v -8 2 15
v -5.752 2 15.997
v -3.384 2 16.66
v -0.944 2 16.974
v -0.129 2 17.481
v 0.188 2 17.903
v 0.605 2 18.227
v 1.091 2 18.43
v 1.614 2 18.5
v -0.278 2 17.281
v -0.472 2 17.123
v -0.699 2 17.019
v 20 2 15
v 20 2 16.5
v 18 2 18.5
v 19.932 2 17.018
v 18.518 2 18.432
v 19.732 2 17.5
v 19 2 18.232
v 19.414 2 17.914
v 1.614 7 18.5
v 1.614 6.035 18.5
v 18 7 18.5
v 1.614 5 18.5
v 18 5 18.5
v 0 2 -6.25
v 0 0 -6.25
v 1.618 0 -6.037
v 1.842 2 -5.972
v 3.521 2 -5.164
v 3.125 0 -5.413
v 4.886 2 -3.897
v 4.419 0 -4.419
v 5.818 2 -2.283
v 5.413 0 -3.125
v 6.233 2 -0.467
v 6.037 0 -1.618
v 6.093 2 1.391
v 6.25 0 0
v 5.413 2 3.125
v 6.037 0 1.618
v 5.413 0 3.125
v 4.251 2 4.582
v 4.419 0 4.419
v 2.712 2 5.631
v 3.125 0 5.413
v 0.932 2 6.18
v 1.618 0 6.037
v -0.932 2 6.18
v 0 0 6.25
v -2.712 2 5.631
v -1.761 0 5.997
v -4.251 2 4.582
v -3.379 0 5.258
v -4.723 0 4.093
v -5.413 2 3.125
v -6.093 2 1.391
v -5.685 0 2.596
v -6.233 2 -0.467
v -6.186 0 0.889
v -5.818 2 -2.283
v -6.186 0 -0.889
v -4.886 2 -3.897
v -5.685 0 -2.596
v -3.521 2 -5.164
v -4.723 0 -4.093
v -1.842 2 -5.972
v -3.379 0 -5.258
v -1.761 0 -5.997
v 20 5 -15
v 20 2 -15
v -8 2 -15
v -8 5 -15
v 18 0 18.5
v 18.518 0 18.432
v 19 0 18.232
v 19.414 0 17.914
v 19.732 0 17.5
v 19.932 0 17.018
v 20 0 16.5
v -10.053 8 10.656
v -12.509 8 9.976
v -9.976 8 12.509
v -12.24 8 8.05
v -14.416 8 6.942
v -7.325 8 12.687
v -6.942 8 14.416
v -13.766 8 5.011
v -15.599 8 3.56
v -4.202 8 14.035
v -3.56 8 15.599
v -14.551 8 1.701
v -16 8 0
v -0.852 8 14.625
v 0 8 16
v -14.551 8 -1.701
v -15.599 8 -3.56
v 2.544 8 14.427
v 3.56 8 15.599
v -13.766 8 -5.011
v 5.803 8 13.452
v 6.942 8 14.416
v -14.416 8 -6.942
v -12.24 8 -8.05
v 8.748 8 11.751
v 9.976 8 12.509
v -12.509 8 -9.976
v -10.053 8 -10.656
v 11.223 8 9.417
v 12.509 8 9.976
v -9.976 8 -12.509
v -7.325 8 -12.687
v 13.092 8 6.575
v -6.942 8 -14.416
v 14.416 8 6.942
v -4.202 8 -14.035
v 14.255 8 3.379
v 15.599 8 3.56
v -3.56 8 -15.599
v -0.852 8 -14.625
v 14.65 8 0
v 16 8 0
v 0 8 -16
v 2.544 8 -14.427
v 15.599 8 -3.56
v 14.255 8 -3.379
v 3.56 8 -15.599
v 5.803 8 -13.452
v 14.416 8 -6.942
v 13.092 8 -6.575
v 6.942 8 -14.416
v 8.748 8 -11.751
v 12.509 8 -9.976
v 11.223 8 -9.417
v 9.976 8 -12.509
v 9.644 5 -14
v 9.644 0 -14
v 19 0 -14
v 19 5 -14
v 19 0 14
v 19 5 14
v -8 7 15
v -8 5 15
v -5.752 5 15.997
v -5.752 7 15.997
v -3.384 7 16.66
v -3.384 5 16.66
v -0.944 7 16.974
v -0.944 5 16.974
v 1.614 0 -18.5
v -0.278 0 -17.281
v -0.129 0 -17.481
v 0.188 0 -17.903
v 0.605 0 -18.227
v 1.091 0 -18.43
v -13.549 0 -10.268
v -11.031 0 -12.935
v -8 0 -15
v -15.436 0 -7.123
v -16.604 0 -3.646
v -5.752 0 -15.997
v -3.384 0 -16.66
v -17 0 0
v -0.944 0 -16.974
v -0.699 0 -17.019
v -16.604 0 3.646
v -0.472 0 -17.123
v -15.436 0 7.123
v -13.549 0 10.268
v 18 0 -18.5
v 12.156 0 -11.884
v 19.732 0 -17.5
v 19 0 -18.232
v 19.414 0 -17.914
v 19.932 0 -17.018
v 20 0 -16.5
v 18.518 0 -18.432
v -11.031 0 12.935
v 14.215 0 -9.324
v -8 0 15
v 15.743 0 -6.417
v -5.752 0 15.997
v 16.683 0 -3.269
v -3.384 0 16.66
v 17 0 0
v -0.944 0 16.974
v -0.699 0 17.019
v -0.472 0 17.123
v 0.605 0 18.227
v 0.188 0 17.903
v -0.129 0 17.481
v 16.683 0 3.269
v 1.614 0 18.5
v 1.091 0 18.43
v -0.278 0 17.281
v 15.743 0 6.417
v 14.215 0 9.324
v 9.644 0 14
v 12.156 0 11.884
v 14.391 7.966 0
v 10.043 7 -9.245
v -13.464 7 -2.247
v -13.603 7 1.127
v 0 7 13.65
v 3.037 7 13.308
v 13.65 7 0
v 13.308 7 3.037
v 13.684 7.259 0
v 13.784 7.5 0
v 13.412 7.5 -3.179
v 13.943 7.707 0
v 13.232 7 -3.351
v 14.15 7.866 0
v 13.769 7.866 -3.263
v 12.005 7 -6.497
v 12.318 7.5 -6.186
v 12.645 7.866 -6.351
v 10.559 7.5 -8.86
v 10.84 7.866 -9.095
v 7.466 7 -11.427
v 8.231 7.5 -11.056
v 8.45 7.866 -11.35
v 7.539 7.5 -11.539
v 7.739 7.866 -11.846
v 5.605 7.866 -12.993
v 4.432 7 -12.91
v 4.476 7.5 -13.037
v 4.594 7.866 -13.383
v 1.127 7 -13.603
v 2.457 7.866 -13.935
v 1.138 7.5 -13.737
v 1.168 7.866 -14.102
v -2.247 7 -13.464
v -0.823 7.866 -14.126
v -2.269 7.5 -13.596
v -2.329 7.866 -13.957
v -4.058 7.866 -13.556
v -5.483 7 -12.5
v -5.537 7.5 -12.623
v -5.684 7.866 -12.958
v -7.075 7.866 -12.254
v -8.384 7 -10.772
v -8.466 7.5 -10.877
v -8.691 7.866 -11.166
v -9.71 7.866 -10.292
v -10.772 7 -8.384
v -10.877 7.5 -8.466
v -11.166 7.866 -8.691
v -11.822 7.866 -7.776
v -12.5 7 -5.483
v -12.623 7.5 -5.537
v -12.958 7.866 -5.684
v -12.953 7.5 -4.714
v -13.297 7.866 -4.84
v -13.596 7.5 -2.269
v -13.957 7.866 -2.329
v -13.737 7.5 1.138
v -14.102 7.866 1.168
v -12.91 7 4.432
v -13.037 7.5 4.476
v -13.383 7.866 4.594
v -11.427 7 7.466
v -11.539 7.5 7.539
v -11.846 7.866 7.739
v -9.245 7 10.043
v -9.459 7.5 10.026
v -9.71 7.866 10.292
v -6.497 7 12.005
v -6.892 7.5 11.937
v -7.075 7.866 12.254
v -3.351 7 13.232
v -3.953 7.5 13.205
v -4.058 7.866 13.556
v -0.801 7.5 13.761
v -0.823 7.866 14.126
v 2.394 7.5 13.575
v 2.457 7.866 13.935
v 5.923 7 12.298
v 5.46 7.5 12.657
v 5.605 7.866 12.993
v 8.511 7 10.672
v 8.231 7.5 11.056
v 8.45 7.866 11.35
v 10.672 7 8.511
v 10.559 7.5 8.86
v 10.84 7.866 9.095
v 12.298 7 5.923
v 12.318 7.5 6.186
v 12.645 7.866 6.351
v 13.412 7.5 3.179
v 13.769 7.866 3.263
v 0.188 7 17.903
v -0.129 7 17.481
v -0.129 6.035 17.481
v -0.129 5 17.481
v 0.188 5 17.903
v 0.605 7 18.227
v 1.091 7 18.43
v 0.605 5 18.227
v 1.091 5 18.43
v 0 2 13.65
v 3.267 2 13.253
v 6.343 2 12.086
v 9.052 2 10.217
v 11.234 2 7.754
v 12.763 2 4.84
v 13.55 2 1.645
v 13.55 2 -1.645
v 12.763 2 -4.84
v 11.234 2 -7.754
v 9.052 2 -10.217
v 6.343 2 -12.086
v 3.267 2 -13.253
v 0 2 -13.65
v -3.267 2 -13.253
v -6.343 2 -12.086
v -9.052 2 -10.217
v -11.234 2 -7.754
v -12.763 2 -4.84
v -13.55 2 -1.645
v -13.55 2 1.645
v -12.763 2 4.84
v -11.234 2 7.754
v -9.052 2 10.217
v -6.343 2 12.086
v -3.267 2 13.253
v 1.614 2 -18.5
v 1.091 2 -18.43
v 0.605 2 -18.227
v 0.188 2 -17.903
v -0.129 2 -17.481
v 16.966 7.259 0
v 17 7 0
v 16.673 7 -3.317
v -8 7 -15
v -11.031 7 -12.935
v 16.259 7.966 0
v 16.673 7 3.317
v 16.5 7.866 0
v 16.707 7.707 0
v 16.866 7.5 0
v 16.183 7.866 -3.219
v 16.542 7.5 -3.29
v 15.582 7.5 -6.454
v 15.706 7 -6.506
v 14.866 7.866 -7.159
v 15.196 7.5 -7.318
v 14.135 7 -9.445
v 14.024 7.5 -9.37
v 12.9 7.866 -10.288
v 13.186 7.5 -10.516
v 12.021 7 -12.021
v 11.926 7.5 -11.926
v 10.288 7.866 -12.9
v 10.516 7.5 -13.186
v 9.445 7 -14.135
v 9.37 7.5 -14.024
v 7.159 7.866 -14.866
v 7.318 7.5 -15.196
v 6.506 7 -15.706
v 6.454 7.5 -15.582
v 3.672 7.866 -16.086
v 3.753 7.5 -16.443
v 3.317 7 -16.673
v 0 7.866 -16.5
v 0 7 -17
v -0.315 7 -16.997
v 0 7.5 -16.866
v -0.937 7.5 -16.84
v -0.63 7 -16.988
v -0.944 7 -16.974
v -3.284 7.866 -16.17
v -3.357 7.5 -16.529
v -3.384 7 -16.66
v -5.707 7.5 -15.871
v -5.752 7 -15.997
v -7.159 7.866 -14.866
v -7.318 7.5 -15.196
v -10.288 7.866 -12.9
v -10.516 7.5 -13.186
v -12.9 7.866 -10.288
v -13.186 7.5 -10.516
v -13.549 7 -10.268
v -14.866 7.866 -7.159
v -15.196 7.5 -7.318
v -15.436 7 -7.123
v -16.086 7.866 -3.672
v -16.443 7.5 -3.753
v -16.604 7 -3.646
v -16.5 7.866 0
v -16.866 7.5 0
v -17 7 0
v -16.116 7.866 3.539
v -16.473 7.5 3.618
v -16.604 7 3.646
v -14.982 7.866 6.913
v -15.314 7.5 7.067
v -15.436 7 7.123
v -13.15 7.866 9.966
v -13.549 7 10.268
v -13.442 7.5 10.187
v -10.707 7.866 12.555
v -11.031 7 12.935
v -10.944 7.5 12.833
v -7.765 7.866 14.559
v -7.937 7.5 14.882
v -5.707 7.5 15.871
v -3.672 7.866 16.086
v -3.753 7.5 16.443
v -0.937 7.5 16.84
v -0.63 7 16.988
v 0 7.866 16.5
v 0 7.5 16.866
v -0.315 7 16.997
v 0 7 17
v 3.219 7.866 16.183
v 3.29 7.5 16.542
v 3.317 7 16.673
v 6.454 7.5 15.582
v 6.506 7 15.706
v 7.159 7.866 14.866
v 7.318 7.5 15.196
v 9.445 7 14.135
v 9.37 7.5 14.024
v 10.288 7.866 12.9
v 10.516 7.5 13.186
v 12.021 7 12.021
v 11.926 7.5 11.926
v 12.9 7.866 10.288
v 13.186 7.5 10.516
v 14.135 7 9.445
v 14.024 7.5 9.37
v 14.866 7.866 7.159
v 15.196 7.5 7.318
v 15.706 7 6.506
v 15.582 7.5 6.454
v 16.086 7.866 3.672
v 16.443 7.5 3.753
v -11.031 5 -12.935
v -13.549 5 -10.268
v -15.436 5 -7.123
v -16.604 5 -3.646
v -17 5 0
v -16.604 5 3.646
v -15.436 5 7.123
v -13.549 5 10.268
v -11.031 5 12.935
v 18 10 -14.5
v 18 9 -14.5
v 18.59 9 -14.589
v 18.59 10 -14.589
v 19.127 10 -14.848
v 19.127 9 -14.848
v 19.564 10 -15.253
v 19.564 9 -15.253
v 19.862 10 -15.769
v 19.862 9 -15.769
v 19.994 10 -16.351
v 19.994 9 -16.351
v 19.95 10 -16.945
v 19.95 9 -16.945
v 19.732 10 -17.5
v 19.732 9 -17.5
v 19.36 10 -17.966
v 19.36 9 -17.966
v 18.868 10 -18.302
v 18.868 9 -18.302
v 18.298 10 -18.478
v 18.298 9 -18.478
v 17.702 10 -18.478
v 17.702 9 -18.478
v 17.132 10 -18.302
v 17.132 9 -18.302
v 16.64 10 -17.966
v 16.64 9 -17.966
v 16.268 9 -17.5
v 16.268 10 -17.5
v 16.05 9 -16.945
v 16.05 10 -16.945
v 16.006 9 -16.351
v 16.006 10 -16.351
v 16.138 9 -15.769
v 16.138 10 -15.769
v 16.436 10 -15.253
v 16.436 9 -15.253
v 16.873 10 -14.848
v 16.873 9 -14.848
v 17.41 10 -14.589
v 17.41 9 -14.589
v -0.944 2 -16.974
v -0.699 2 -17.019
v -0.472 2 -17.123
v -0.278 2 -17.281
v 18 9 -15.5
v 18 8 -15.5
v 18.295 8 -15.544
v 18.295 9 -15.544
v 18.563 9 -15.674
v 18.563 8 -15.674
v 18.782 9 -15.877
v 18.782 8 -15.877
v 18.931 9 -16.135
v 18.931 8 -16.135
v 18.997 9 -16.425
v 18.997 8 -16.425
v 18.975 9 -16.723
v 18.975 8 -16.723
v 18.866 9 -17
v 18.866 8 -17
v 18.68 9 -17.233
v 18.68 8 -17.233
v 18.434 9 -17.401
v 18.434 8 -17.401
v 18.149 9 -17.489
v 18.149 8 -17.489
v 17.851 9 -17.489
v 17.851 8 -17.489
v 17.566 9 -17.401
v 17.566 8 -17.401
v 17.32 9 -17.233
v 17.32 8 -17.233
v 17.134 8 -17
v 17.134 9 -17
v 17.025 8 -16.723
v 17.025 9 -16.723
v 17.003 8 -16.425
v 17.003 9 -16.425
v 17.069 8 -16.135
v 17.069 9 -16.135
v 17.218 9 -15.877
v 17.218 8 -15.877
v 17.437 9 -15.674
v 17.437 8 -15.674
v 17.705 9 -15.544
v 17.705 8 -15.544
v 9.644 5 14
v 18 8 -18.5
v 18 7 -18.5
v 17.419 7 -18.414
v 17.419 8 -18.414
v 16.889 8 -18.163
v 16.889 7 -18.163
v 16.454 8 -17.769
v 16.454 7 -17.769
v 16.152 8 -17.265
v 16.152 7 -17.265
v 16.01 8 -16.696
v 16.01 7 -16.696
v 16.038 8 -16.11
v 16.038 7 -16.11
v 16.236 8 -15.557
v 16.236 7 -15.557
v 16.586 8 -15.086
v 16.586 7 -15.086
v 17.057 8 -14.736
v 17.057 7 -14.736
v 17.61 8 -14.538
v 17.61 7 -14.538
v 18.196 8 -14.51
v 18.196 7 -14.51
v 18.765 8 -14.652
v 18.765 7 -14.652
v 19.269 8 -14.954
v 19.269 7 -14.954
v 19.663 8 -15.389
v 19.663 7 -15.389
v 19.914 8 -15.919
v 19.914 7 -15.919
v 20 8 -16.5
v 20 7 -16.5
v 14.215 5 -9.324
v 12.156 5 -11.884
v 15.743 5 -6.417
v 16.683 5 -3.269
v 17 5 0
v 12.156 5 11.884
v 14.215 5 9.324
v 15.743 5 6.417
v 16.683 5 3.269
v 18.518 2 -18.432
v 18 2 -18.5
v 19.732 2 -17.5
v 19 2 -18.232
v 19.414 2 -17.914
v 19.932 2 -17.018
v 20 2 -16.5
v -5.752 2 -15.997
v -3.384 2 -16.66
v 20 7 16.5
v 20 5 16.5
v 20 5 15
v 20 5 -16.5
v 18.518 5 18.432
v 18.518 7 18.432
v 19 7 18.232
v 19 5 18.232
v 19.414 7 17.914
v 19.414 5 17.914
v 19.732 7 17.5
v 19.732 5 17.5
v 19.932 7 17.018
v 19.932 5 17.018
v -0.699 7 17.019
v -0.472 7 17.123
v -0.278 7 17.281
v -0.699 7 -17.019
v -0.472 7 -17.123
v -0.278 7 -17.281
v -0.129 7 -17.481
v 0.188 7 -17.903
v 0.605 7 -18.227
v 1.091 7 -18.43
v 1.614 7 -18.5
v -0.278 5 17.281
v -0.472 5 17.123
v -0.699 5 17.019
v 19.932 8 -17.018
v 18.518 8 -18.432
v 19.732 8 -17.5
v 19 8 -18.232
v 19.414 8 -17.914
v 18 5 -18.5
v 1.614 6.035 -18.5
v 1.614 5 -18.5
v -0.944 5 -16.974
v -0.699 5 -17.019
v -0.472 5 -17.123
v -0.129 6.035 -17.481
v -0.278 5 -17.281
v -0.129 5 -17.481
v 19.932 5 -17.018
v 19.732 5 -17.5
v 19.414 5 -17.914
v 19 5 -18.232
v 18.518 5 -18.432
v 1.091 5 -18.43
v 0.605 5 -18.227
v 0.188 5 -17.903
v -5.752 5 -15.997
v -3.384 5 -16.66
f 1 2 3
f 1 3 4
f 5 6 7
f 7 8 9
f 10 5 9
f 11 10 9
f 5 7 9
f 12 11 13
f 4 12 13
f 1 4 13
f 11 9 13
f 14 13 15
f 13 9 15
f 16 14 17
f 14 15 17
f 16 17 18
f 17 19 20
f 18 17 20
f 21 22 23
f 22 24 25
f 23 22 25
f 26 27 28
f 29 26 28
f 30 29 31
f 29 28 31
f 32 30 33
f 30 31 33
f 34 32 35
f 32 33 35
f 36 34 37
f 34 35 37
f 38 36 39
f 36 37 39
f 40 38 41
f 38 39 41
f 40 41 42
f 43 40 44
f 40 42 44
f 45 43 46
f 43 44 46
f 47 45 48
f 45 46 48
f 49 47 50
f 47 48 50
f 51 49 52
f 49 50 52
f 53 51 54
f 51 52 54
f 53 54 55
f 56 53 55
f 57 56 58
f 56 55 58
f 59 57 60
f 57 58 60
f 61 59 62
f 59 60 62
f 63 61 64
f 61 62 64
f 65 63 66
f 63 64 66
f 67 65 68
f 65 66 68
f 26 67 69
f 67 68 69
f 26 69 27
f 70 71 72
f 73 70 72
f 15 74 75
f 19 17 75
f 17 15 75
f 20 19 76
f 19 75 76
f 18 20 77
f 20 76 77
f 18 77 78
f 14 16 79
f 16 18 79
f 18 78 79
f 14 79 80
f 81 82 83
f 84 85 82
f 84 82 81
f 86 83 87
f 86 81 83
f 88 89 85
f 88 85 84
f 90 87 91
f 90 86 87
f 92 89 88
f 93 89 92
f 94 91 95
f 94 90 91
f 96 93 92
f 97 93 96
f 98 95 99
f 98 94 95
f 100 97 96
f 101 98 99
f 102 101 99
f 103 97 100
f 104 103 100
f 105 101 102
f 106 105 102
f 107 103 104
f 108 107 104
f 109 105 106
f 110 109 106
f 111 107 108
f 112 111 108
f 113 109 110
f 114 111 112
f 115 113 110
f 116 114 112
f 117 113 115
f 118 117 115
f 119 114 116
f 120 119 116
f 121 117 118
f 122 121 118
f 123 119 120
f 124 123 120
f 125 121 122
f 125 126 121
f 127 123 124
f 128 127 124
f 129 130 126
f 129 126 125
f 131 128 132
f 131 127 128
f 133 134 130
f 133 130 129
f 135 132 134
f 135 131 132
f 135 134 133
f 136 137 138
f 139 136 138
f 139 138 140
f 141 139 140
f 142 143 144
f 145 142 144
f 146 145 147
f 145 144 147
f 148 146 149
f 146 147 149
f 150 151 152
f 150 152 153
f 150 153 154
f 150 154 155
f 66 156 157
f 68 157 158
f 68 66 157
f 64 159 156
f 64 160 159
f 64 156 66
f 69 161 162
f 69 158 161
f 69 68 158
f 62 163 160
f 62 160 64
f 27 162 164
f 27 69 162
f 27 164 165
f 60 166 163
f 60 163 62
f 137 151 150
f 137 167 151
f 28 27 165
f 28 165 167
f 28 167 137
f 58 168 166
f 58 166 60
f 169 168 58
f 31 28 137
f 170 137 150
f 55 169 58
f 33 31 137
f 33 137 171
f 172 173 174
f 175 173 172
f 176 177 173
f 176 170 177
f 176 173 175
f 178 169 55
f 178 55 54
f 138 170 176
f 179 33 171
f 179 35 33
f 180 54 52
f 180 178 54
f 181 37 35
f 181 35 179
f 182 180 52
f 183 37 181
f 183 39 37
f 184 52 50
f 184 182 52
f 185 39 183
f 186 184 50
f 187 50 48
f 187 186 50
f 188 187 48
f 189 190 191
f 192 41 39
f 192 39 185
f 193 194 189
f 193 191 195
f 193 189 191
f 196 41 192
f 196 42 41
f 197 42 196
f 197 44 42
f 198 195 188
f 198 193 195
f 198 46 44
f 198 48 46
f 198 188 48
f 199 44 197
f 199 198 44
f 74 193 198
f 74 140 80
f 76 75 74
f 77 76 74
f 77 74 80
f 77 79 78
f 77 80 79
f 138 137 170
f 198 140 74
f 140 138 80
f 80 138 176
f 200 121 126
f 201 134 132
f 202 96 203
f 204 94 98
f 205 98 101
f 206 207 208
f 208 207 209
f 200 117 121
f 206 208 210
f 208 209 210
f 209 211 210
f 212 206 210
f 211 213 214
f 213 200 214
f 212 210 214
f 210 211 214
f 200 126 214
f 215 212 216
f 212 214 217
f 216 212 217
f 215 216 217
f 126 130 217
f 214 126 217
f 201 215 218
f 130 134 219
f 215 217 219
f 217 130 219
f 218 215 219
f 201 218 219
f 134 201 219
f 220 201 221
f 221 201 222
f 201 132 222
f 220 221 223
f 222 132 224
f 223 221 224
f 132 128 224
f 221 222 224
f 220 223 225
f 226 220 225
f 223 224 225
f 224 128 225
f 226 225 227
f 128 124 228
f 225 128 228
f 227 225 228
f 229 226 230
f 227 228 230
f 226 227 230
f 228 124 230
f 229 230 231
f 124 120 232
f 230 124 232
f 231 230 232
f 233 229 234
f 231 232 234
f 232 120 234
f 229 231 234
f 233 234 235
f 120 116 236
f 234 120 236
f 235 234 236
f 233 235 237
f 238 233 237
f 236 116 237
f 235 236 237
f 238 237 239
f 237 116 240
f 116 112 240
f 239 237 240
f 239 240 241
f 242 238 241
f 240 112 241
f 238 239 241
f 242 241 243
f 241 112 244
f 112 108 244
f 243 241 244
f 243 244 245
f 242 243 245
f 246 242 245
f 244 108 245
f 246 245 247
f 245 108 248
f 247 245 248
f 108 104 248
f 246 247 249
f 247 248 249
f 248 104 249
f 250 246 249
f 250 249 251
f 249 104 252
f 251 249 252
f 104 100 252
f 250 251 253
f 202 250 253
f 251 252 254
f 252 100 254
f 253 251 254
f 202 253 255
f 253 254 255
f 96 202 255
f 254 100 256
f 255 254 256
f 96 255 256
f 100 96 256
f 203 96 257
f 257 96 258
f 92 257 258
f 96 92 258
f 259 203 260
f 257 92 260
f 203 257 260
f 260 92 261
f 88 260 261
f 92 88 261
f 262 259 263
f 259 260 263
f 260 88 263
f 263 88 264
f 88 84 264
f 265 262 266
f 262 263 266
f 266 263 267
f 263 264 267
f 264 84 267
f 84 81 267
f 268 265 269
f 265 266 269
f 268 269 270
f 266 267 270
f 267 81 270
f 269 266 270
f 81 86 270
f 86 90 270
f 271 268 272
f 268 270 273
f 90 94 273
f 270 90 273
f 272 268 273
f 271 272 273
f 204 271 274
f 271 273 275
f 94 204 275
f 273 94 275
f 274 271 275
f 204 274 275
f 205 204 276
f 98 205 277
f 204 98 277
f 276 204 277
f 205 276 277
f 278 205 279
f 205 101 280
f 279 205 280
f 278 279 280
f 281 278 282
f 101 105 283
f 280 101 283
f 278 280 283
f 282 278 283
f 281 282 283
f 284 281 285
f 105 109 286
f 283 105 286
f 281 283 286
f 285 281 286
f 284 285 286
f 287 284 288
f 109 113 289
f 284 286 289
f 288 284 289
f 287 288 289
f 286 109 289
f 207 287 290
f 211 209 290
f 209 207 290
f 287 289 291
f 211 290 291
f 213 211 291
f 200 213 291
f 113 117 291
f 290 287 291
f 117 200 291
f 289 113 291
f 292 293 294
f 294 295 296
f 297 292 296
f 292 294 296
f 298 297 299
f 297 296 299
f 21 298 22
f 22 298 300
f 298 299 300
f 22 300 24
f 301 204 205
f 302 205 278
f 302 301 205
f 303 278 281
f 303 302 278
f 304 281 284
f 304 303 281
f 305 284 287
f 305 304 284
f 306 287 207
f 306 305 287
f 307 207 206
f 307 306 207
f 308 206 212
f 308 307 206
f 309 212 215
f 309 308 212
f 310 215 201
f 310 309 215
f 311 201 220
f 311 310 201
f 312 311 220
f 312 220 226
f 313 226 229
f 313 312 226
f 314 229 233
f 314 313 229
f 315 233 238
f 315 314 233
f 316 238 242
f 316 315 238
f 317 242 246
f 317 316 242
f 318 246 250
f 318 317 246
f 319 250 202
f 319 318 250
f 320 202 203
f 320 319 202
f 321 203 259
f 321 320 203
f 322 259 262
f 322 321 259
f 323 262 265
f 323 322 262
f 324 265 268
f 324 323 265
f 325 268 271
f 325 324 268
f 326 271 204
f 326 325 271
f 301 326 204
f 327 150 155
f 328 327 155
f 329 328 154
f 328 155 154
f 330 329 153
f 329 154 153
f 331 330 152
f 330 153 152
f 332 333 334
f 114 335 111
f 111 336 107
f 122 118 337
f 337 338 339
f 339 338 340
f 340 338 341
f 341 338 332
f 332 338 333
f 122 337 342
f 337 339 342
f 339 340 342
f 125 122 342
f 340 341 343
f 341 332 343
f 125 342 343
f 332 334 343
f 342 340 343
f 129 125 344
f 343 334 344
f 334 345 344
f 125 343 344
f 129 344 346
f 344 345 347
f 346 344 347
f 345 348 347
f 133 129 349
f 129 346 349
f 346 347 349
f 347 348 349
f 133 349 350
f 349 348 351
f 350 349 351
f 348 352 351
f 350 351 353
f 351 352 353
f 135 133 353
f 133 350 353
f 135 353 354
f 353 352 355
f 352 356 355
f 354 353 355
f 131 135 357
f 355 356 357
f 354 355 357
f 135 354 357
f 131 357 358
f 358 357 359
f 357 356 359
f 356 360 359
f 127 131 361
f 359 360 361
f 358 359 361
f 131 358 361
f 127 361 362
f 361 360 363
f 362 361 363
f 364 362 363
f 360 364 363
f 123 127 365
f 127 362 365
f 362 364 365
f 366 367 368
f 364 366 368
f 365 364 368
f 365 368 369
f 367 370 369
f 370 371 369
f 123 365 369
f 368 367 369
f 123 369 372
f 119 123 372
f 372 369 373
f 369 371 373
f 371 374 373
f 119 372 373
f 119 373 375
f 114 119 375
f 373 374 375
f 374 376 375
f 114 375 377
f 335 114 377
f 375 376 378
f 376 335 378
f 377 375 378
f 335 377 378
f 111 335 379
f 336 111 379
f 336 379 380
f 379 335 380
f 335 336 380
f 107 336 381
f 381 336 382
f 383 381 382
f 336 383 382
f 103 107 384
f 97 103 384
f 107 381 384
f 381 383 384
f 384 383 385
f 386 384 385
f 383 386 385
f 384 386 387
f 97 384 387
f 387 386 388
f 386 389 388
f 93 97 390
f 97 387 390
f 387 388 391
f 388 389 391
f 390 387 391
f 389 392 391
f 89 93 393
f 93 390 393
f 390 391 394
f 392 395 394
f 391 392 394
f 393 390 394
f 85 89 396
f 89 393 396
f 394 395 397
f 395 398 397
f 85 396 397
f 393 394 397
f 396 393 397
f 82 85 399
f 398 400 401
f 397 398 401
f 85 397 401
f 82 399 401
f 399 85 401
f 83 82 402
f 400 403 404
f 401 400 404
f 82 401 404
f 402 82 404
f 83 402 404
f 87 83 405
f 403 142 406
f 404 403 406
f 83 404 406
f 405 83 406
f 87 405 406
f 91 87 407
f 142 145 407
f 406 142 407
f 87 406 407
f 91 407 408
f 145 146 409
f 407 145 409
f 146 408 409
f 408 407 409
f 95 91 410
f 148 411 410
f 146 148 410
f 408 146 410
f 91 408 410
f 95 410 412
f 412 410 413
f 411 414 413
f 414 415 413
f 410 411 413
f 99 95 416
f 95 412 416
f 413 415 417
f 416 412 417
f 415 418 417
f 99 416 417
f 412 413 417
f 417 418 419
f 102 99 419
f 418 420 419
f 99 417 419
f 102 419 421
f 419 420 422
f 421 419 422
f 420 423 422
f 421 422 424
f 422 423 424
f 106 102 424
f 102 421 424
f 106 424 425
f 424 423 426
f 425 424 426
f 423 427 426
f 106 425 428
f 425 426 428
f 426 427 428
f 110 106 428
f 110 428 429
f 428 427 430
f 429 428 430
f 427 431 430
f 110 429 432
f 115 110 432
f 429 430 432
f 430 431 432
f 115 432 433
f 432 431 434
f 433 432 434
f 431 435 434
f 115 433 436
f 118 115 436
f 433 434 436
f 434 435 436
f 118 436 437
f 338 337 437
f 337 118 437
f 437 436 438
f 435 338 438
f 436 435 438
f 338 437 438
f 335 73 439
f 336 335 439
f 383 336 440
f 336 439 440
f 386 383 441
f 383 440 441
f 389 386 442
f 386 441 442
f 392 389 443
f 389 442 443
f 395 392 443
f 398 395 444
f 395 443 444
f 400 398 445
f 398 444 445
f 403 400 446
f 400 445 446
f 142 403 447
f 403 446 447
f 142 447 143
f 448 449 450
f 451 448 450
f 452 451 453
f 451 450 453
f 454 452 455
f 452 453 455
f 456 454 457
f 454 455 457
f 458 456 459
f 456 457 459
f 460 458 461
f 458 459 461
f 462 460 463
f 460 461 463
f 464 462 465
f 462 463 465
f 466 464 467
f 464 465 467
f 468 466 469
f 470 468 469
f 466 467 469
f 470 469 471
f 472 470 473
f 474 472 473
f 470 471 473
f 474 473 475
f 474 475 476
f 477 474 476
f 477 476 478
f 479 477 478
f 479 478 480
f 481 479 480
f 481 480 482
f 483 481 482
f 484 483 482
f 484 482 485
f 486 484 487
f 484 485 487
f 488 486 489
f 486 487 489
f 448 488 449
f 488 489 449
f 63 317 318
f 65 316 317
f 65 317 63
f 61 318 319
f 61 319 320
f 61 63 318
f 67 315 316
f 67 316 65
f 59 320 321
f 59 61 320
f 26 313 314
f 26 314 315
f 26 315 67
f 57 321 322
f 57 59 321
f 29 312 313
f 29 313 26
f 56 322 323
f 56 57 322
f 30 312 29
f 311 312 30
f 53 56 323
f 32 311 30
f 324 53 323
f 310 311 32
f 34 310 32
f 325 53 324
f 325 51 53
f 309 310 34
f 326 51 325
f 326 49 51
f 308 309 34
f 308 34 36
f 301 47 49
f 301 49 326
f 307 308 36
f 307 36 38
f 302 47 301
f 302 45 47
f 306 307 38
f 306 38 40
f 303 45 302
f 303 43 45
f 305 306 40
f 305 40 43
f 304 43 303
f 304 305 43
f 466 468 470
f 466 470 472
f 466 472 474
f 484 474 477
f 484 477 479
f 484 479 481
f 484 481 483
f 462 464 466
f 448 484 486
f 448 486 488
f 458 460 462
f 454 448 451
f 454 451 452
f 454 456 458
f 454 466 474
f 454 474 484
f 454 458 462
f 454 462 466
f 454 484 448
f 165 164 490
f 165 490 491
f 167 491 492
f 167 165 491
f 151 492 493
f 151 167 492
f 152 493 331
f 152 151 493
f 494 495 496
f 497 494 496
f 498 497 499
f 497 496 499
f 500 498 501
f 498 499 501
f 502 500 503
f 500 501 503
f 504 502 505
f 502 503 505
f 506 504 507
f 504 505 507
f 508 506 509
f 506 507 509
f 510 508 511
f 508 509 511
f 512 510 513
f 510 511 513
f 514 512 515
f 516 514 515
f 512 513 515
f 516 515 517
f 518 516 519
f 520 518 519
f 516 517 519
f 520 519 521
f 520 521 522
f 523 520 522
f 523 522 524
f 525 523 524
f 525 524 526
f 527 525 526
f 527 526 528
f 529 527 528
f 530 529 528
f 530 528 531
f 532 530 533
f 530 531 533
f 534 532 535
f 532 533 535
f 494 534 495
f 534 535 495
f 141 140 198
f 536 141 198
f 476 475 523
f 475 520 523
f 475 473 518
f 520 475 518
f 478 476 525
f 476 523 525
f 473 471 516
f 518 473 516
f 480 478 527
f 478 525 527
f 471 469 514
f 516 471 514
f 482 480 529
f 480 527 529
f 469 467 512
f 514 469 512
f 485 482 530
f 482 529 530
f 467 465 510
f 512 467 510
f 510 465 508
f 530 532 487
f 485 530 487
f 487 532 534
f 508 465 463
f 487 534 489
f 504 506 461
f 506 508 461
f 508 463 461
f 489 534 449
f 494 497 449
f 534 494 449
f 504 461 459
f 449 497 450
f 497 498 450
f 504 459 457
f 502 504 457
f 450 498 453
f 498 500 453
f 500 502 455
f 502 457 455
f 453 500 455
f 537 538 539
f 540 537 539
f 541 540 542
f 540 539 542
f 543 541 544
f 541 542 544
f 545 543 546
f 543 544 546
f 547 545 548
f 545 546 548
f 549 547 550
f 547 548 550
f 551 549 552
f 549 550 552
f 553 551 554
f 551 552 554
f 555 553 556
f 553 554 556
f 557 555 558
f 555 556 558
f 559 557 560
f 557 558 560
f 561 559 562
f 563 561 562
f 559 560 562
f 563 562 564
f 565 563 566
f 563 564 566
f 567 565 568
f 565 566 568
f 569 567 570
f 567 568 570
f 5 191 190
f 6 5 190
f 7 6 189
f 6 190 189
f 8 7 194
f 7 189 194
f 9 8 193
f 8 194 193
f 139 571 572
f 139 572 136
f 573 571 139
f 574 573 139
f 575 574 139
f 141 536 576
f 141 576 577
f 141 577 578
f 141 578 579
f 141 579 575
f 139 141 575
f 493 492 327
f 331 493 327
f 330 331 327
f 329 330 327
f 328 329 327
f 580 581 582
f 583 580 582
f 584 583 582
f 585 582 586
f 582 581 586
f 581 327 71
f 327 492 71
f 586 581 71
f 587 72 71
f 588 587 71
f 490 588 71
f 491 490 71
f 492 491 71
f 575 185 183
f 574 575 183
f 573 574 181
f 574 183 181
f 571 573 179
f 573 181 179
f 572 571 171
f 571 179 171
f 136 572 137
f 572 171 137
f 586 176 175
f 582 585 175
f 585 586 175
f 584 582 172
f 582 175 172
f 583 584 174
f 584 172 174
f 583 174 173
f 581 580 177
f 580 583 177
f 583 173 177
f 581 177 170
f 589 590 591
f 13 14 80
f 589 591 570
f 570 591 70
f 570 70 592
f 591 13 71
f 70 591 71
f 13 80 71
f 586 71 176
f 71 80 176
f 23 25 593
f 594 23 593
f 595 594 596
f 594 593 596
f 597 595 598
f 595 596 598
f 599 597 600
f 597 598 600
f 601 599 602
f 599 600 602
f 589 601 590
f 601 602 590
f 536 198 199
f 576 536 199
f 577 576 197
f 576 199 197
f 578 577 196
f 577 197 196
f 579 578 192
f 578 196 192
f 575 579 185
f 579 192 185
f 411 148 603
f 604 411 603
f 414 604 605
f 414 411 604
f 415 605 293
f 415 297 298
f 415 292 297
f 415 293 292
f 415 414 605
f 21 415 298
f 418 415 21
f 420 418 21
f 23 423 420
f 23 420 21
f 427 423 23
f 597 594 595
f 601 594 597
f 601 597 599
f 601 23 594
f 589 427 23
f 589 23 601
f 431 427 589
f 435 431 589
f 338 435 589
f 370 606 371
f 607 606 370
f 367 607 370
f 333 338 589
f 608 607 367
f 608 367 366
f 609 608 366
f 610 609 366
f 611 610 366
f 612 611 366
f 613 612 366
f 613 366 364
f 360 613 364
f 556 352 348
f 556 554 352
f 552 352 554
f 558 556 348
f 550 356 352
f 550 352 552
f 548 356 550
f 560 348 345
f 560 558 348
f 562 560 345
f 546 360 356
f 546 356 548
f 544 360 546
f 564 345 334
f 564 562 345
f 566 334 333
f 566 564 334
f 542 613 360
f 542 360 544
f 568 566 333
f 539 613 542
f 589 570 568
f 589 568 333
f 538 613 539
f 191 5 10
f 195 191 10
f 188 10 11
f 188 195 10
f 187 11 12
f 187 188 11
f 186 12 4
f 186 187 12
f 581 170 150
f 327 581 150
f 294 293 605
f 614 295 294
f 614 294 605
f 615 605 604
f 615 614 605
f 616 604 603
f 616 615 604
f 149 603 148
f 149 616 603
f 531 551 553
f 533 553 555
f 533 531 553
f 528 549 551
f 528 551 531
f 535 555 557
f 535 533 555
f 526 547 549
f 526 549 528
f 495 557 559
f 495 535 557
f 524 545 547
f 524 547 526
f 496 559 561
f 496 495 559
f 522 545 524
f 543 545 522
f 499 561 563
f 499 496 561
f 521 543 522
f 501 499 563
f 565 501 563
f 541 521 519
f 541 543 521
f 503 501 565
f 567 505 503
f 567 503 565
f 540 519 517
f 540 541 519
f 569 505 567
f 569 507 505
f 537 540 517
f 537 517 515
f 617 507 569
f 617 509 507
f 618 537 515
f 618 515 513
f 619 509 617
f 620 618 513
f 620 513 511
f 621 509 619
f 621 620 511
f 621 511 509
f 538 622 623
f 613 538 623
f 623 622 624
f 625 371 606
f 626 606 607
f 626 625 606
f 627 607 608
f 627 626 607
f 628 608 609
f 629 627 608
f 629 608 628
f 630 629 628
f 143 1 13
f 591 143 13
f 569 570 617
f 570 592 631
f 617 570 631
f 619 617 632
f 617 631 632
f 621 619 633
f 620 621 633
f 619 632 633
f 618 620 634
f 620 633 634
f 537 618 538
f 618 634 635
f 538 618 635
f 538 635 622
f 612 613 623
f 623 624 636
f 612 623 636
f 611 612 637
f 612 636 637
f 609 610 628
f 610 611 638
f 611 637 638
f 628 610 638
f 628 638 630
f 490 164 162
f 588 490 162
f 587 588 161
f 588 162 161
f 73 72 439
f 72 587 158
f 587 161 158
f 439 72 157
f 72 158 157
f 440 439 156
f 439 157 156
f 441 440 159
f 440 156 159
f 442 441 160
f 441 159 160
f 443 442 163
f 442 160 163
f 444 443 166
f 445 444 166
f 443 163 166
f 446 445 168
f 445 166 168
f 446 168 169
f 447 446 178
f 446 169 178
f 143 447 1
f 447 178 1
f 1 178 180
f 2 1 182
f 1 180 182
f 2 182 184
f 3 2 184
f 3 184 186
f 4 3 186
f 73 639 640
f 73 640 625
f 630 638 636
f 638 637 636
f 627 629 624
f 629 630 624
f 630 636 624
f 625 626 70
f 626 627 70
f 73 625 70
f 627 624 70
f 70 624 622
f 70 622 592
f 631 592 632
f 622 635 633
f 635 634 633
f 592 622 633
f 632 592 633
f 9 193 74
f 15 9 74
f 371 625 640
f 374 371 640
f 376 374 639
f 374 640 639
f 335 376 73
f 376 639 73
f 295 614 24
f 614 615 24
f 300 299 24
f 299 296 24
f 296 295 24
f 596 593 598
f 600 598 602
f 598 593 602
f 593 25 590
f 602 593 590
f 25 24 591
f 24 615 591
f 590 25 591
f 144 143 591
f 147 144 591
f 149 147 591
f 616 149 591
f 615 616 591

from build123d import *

# Parameters (mm, degrees)
EXTRUDE_1_DEPTH      = 2
EXTRUDE_2_DEPTH      = 3
EXTRUDE_3_DEPTH      = 2
CUT_EXTRUDE_START    = -5
SKETCH_4_R           = 13.65
SKETCH_4_R_2         = 6.25
CUT_EXTRUDE_4_DEPTH  = 5
SKETCH_4_3_R         = 13.65
EXTRUDE_5_DEPTH      = 1
FILLET_2_R           = 1
FILLET_3_R           = 2
EXTRUDE_6_DEPTH      = 1
SKETCH_6_R           = 1
EXTRUDE_7_DEPTH      = 1
SKETCH_7_R           = 2
EXTRUDE_8_DEPTH      = 1
CUT_EXTRUDE_10_DEPTH = 5


with BuildPart() as part:
    # 草图1 → 拉伸1 (new body)
    with BuildSketch(Plane(origin=(0, 0, 0), x_dir=(1, 0, 0), z_dir=(0, 1, 0))):
        with BuildLine():
            Line((0, 15), (-8, 15))
            ThreePointArc((-8, 15), (-14.577379737, 8.746427842), (-17, 0))
            ThreePointArc((-17, 0), (-14.577379737, -8.746427842), (-8, -15))
            Line((-8, -15), (0, -15))
            Line((0, -15), (0, -6.25))
            ThreePointArc((0, -6.25), (-6.25, 0), (0, 6.25))
            Line((0, 6.25), (0, 15))
        make_face()
        with BuildLine():
            Line((8, 15), (0, 15))
            Line((0, 15), (0, 6.25))
            ThreePointArc((0, 6.25), (4.419417382, 4.419417382), (6.25, 0))
            ThreePointArc((6.25, 0), (4.419417382, -4.419417382), (0, -6.25))
            Line((0, -6.25), (0, -15))
            Line((0, -15), (8, -15))
            ThreePointArc((8, -15), (14.577379737, -8.746427842), (17, 0))
            ThreePointArc((17, 0), (14.577379737, 8.746427842), (8, 15))
        make_face()
        with BuildLine():
            Line((0, 15), (-8, 15))
            ThreePointArc((-8, 15), (-14.577379737, 8.746427842), (-17, 0))
            ThreePointArc((-17, 0), (-14.577379737, -8.746427842), (-8, -15))
            Line((-8, -15), (0, -15))
            Line((0, -15), (0, -6.25))
            ThreePointArc((0, -6.25), (-6.25, 0), (0, 6.25))
            Line((0, 6.25), (0, 15))
        make_face()
        with BuildLine():
            Line((8, 15), (0, 15))
            Line((0, 15), (0, 6.25))
            ThreePointArc((0, 6.25), (4.419417382, 4.419417382), (6.25, 0))
            ThreePointArc((6.25, 0), (4.419417382, -4.419417382), (0, -6.25))
            Line((0, -6.25), (0, -15))
            Line((0, -15), (8, -15))
            ThreePointArc((8, -15), (14.577379737, -8.746427842), (17, 0))
            ThreePointArc((17, 0), (14.577379737, 8.746427842), (8, 15))
        make_face()
        with BuildLine():
            Line((20, 15), (8, 15))
            ThreePointArc((8, 15), (14.577379737, 8.746427842), (17, 0))
            ThreePointArc((17, 0), (14.577379737, -8.746427842), (8, -15))
            Line((8, -15), (20, -15))
            Line((20, -15), (20, 15))
        make_face()
        with BuildLine():
            Line((0, 18.5), (0, 17))
            ThreePointArc((0, 17), (4.123105626, 16.492422502), (8, 15))
            Line((8, 15), (20, 15))
            Line((20, 15), (20, 18.5))
            Line((20, 18.5), (0, 18.5))
        make_face()
        with BuildLine():
            ThreePointArc((8, -15), (4.123105626, -16.492422502), (0, -17))
            Line((0, -17), (0, -18.5))
            Line((0, -18.5), (20, -18.5))
            Line((20, -18.5), (20, -15))
            Line((20, -15), (8, -15))
        make_face()
        with BuildLine():
            ThreePointArc((0, 17), (-4.123105626, 16.492422502), (-8, 15))
            Line((-8, 15), (0, 15))
            Line((0, 15), (0, 17))
        make_face()
        with BuildLine():
            Line((0, 17), (0, 15))
            Line((0, 15), (8, 15))
            ThreePointArc((8, 15), (4.123105626, 16.492422502), (0, 17))
        make_face()
        with BuildLine():
            ThreePointArc((0, 17), (-4.123105626, 16.492422502), (-8, 15))
            Line((-8, 15), (0, 15))
            Line((0, 15), (0, 17))
        make_face()
        with BuildLine():
            Line((0, 17), (0, 15))
            Line((0, 15), (8, 15))
            ThreePointArc((8, 15), (4.123105626, 16.492422502), (0, 17))
        make_face()
        with BuildLine():
            Line((0, -15), (-8, -15))
            ThreePointArc((-8, -15), (-4.123105626, -16.492422502), (0, -17))
            Line((0, -17), (0, -15))
        make_face()
        with BuildLine():
            Line((8, -15), (0, -15))
            Line((0, -15), (0, -17))
            ThreePointArc((0, -17), (4.123105626, -16.492422502), (8, -15))
        make_face()
        with BuildLine():
            Line((0, -15), (-8, -15))
            ThreePointArc((-8, -15), (-4.123105626, -16.492422502), (0, -17))
            Line((0, -17), (0, -15))
        make_face()
        with BuildLine():
            Line((8, -15), (0, -15))
            Line((0, -15), (0, -17))
            ThreePointArc((0, -17), (4.123105626, -16.492422502), (8, -15))
        make_face()
    extrude(amount=EXTRUDE_1_DEPTH)

    # 草图2 → 拉伸2 (add)
    with BuildSketch(Plane(origin=(0, 2, 0), x_dir=(1, 0, 0), z_dir=(0, 1, 0))):
        with BuildLine():
            Line((0, 6.25), (0, 15))
            Line((0, 15), (-8, 15))
            ThreePointArc((-8, 15), (-14.577379737, 8.746427842), (-17, 0))
            ThreePointArc((-17, 0), (-14.577379737, -8.746427842), (-8, -15))
            Line((-8, -15), (0, -15))
            Line((0, -15), (0, -6.25))
            ThreePointArc((0, -6.25), (-6.25, 0), (0, 6.25))
        make_face()
        with BuildLine():
            ThreePointArc((17, 0), (14.577379737, 8.746427842), (8, 15))
            Line((8, 15), (0, 15))
            Line((0, 15), (0, 6.25))
            ThreePointArc((0, 6.25), (4.419417382, 4.419417382), (6.25, 0))
            ThreePointArc((6.25, 0), (4.419417382, -4.419417382), (0, -6.25))
            Line((0, -6.25), (0, -15))
            Line((0, -15), (8, -15))
            ThreePointArc((8, -15), (14.577379737, -8.746427842), (17, 0))
        make_face()
        with BuildLine():
            Line((0, 6.25), (0, 15))
            Line((0, 15), (-8, 15))
            ThreePointArc((-8, 15), (-14.577379737, 8.746427842), (-17, 0))
            ThreePointArc((-17, 0), (-14.577379737, -8.746427842), (-8, -15))
            Line((-8, -15), (0, -15))
            Line((0, -15), (0, -6.25))
            ThreePointArc((0, -6.25), (-6.25, 0), (0, 6.25))
        make_face()
        with BuildLine():
            Line((20, -15), (20, 15))
            Line((20, 15), (8, 15))
            ThreePointArc((8, 15), (14.577379737, 8.746427842), (17, 0))
            ThreePointArc((17, 0), (14.577379737, -8.746427842), (8, -15))
            Line((8, -15), (20, -15))
        make_face()
    extrude(amount=EXTRUDE_2_DEPTH)

    # 草图3 → 拉伸3 (add)
    with BuildSketch(Plane(origin=(0, 5, 0), x_dir=(1, 0, 0), z_dir=(0, 1, 0))):
        with BuildLine():
            Line((0, 6.25), (0, 15))
            Line((0, 15), (-8, 15))
            ThreePointArc((-8, 15), (-14.577379738, 8.746427841), (-17, -3e-09))
            ThreePointArc((-17, -3e-09), (-14.577379736, -8.746427843), (-8, -15))
            Line((-8, -15), (0, -15))
            Line((0, -15), (0, -6.25))
            ThreePointArc((0, -6.25), (-6.25, 0), (0, 6.25))
        make_face()
        with BuildLine():
            ThreePointArc((8, 15), (4.123105626, 16.492422502), (0, 17))
            Line((0, 17), (0, 15))
            Line((0, 15), (8, 15))
        make_face()
        with BuildLine():
            Line((0, 15), (0, 17))
            ThreePointArc((0, 17), (-4.123105626, 16.492422502), (-8, 15))
            Line((-8, 15), (0, 15))
        make_face()
        with BuildLine():
            ThreePointArc((8, 15), (4.123105626, 16.492422502), (0, 17))
            Line((0, 17), (0, 15))
            Line((0, 15), (8, 15))
        make_face()
        with BuildLine():
            Line((0, 15), (0, 17))
            ThreePointArc((0, 17), (-4.123105626, 16.492422502), (-8, 15))
            Line((-8, 15), (0, 15))
        make_face()
        with BuildLine():
            ThreePointArc((17, 0), (14.577379737, 8.746427842), (8, 15))
            Line((8, 15), (0, 15))
            Line((0, 15), (0, 6.25))
            ThreePointArc((0, 6.25), (4.419417382, 4.419417382), (6.25, 0))
            ThreePointArc((6.25, 0), (4.419417382, -4.419417382), (0, -6.25))
            Line((0, -6.25), (0, -15))
            Line((0, -15), (8, -15))
            ThreePointArc((8, -15), (14.577379737, -8.746427842), (17, 0))
        make_face()
        with BuildLine():
            Line((0, 6.25), (0, 15))
            Line((0, 15), (-8, 15))
            ThreePointArc((-8, 15), (-14.577379738, 8.746427841), (-17, -3e-09))
            ThreePointArc((-17, -3e-09), (-14.577379736, -8.746427843), (-8, -15))
            Line((-8, -15), (0, -15))
            Line((0, -15), (0, -6.25))
            ThreePointArc((0, -6.25), (-6.25, 0), (0, 6.25))
        make_face()
        with BuildLine():
            ThreePointArc((0, -17), (4.123105626, -16.492422502), (8, -15))
            Line((8, -15), (0, -15))
            Line((0, -15), (0, -17))
        make_face()
        with BuildLine():
            Line((0, -17), (0, -15))
            Line((0, -15), (-8, -15))
            ThreePointArc((-8, -15), (-4.123105626, -16.492422502), (0, -17))
        make_face()
        with BuildLine():
            ThreePointArc((0, -17), (4.123105626, -16.492422502), (8, -15))
            Line((8, -15), (0, -15))
            Line((0, -15), (0, -17))
        make_face()
        with BuildLine():
            Line((0, -17), (0, -15))
            Line((0, -15), (-8, -15))
            ThreePointArc((-8, -15), (-4.123105626, -16.492422502), (0, -17))
        make_face()
        with BuildLine():
            Line((20, -15), (20, 15))
            Line((20, 15), (8, 15))
            ThreePointArc((8, 15), (14.577379737, 8.746427842), (17, 0))
            ThreePointArc((17, 0), (14.577379737, -8.746427842), (8, -15))
            Line((8, -15), (20, -15))
        make_face()
        with BuildLine():
            Line((20, 15), (20, 18.5))
            Line((20, 18.5), (0, 18.5))
            Line((0, 18.5), (0, 17))
            ThreePointArc((0, 17), (4.123105626, 16.492422502), (8, 15))
            Line((8, 15), (20, 15))
        make_face()
        with BuildLine():
            Line((20, -18.5), (20, -15))
            Line((20, -15), (8, -15))
            ThreePointArc((8, -15), (4.123105626, -16.492422502), (0, -17))
            Line((0, -17), (0, -18.5))
            Line((0, -18.5), (20, -18.5))
        make_face()
    extrude(amount=EXTRUDE_3_DEPTH)

    # 草图4 → 拉伸4 (cut)
    with BuildSketch(Plane(origin=(0, 7, 0), x_dir=(1, 0, 0), z_dir=(0, 1, 0)).offset(CUT_EXTRUDE_START)):
        with Locations(Location((0, 0, 0), (0, 0, 270))):
            Circle(SKETCH_4_R)
        with Locations(Location((0, 0, 0), (0, 0, 270))):
            Circle(SKETCH_4_R_2, mode=Mode.SUBTRACT)
    extrude(amount=CUT_EXTRUDE_4_DEPTH, mode=Mode.SUBTRACT)

    # 草图4<3> → 拉伸5 (add)
    with BuildSketch(Plane(origin=(0, 7, 0), x_dir=(1, 0, 0), z_dir=(0, 1, 0))):
        with BuildLine():
            ThreePointArc((0, 17), (-17, 0), (0, -17))
            ThreePointArc((0, -17), (12.02081528, -12.02081528), (17, 0))
            ThreePointArc((17, 0), (12.02081528, 12.02081528), (0, 17))
        make_face()
        with Locations(Location((0, 0, 0), (0, 0, 270))):
            Circle(SKETCH_4_3_R, mode=Mode.SUBTRACT)
    extrude(amount=EXTRUDE_5_DEPTH)

    # 圆角1: read off the stored shape, not the designer's step
    # 圆角1 outline → 圆角1 (revolve, cut)
    with BuildSketch(Plane.XY):
        with BuildLine():
            ThreePointArc((16, 8), (16.707106781, 7.707106781), (17, 7))
            Line((17, 7), (17, 8))
            Line((17, 8), (16, 8))
        make_face()
        with BuildLine():
            ThreePointArc((13.65, 7), (13.942893219, 7.707106781), (14.65, 8))
            Line((14.65, 8), (13.65, 8))
            Line((13.65, 8), (13.65, 7))
        make_face()
    revolve(axis=Axis((0, 0, 0), (0, 1, 0)), mode=Mode.SUBTRACT)

    # 圆角2
    # the kernel refuses this fillet: 1 mm, written as the material it adds along each edge
    with BuildSketch(Plane(origin=(0, 0, -17), x_dir=(-0.9996138248178563, 0, 0.027788509010311935), z_dir=(0, 1, 0)), Plane(origin=(0, 5, -17), x_dir=(-0.9996138248178565, 0, 0.027788509010305), z_dir=(0, 1, 0))) as fillet_2_piece_1:
        with BuildLine():
            CenterArc((0.972597815, -0.999613825), FILLET_2_R, 91.592369268, 86.815261463)
            Line((-0.027016009, -0.971825316), (0, 0))
            ThreePointArc((0, 0), (0.472404653, -0.006564978), (0.944809306, 0))
        make_face()
    extrude(amount=2)
    with BuildSketch(Plane(origin=(0, 0, 17), x_dir=(-0.9996138248178561, 0, -0.027788509010319186), z_dir=(0, 1, 0)), Plane(origin=(0, 5, 17), x_dir=(-0.9996138248178563, 0, -0.027788509010312518), z_dir=(0, 1, 0))) as fillet_2_piece_2:
        with BuildLine():
            CenterArc((0.972597815, 0.999613825), FILLET_2_R, 181.592369268, 86.815261463)
            Line((-0.027016009, 0.971825316), (0, 0))
            ThreePointArc((0, 0), (0.472404653, 0.006564978), (0.944809306, 0))
        make_face()
    extrude(amount=2)

    # 圆角3
    # the kernel refuses this fillet: 2 mm, written as the material it takes off along each edge
    with BuildSketch(Plane(origin=(0, -4.034822556, -18.5), x_dir=(-0.12535212734236612, 0, 0.992112314292461), z_dir=(0, 1, 0))) as fillet_3_piece_1:
        with BuildLine():
            CenterArc((1.781915192, 1.851903112), FILLET_3_R, 187.201091139, 60.611190589)
            Line((-0.202309436, 1.601198858), (-0.400731899, 1.576128432))
            Line((-0.400731899, 1.576128432), (-0.198422463, -0.025070425))
            Line((-0.198422463, -0.025070425), (0.025070425, -0.198422463))
            ThreePointArc((0.025070425, -0.198422463), (0.548706555, -0.132261705), (0.951102107, -0.185190311))
            Line((0.951102107, -0.185190311), (1.026630569, 0))
        make_face()
    extrude(amount=10.069645113, mode=Mode.SUBTRACT)
    with BuildSketch(Plane(origin=(20, -5, -18.5), x_dir=(0, 0, 1), z_dir=(0, 1, 0)), Plane(origin=(20, 0, 18.5), x_dir=(-1, 0, 0), z_dir=(0, 1, 0)), Plane(origin=(20, 0, -18.5), x_dir=(0, 0, 1), z_dir=(0, 1, 0))) as fillet_3_piece_2:
        with BuildLine():
            CenterArc((FILLET_3_R, -FILLET_3_R), FILLET_3_R, 90, 90)
            Line((0, -FILLET_3_R), (0, 0))
            Line((0, 0), (FILLET_3_R, 0))
        make_face()
    extrude(amount=12, mode=Mode.SUBTRACT)
    with BuildSketch(Plane(origin=(20, -5, 18.5), x_dir=(0, 0, -1), z_dir=(0, 1, 0))) as fillet_3_piece_3:
        with BuildLine():
            CenterArc((FILLET_3_R, FILLET_3_R), FILLET_3_R, 180, 90)
            Line((0, FILLET_3_R), (0, 0))
            Line((0, 0), (FILLET_3_R, 0))
        make_face()
    extrude(amount=12, mode=Mode.SUBTRACT)
    with BuildSketch(Plane(origin=(0, -4.034822556, 18.5), x_dir=(-0.12535212734236506, 0, -0.9921123142924613), z_dir=(0, 1, 0))) as fillet_3_piece_4:
        with BuildLine():
            CenterArc((1.781915192, -1.851903112), FILLET_3_R, 112.187718272, 60.611190589)
            Line((-0.202309436, -1.601198858), (-0.400731899, -1.576128432))
            Line((-0.400731899, -1.576128432), (-0.198422463, 0.025070425))
            Line((-0.198422463, 0.025070425), (0.025070425, 0.198422463))
            ThreePointArc((0.025070425, 0.198422463), (0.548706555, 0.132261705), (0.951102107, 0.185190311))
            Line((0.951102107, 0.185190311), (1.026630569, 0))
        make_face()
    extrude(amount=10.069645113, mode=Mode.SUBTRACT)
    with BuildSketch(Plane(origin=(0, 0.965177444, 18.5), x_dir=(1, 0, 0), z_dir=(0, 1, 0))) as fillet_3_piece_5:
        with BuildLine():
            CenterArc((1.613929023, 2), FILLET_3_R, 209.388809411, 60.611190589)
            Line((-0.128690326, 1.01853283), (-0.302952261, 0.920386113))
            ThreePointArc((-0.302952261, 0.920386113), (-0.2, 0.527799244), (-0.2, 0))
            Line((-0.2, 0), (0, -0.2))
            Line((0, -0.2), (1.613929023, -0.2))
            Line((1.613929023, -0.2), (1.613929023, 0))
        make_face()
    extrude(amount=10.069645113, mode=Mode.SUBTRACT)
    with BuildSketch(Plane(origin=(0, 0.965177444, -18.5), x_dir=(1, 0, 0), z_dir=(0, 1, 0))) as fillet_3_piece_6:
        with BuildLine():
            CenterArc((1.613929023, -2), FILLET_3_R, 90, 60.611190589)
            Line((-0.128690326, -1.01853283), (-0.302952261, -0.920386113))
            ThreePointArc((-0.302952261, -0.920386113), (-0.2, -0.527799244), (-0.2, 0))
            Line((-0.2, 0), (0, 0.2))
            Line((0, 0.2), (1.613929023, 0.2))
            Line((1.613929023, 0.2), (1.613929023, 0))
        make_face()
    extrude(amount=10.069645113, mode=Mode.SUBTRACT)

    # 草图5 → 拉伸6 (add)
    with BuildSketch(Plane(origin=(0, 7, 0), x_dir=(1, 0, 0), z_dir=(0, 1, 0))):
        with BuildLine():
            ThreePointArc((18, 18.5), (16.585786438, 15.085786438), (20, 16.5))
            ThreePointArc((20, 16.5), (19.414213562, 17.914213562), (18, 18.5))
        make_face()
    extrude(amount=EXTRUDE_6_DEPTH)

    # 草图6 → 拉伸7 (add)
    with BuildSketch(Plane(origin=(0, 8, 0), x_dir=(1, 0, 0), z_dir=(0, 1, 0))):
        with Locations(Location((18, 16.5, 0), (0, 0, 270))):
            Circle(SKETCH_6_R)
    extrude(amount=EXTRUDE_7_DEPTH)

    # 草图7 → 拉伸8 (add)
    with BuildSketch(Plane(origin=(0, 9, 0), x_dir=(1, 0, 0), z_dir=(0, 1, 0))):
        with Locations(Location((18, 16.5, 0), (0, 0, 270))):
            Circle(SKETCH_7_R)
    extrude(amount=EXTRUDE_8_DEPTH)

    # 草图8 → 拉伸10 (cut)
    with BuildSketch(Plane.XZ):
        with BuildLine():
            Line((9.643650761, -14), (19, -14))
            Line((19, -14), (19, 14))
            Line((19, 14), (9.643650761, 14))
            ThreePointArc((9.643650761, 14), (15.048954498, 7.907526069), (17, 0))
            ThreePointArc((17, 0), (15.048954498, -7.907526069), (9.643650761, -14))
        make_face()
    extrude(amount=-CUT_EXTRUDE_10_DEPTH, mode=Mode.SUBTRACT)


solid = part.part
